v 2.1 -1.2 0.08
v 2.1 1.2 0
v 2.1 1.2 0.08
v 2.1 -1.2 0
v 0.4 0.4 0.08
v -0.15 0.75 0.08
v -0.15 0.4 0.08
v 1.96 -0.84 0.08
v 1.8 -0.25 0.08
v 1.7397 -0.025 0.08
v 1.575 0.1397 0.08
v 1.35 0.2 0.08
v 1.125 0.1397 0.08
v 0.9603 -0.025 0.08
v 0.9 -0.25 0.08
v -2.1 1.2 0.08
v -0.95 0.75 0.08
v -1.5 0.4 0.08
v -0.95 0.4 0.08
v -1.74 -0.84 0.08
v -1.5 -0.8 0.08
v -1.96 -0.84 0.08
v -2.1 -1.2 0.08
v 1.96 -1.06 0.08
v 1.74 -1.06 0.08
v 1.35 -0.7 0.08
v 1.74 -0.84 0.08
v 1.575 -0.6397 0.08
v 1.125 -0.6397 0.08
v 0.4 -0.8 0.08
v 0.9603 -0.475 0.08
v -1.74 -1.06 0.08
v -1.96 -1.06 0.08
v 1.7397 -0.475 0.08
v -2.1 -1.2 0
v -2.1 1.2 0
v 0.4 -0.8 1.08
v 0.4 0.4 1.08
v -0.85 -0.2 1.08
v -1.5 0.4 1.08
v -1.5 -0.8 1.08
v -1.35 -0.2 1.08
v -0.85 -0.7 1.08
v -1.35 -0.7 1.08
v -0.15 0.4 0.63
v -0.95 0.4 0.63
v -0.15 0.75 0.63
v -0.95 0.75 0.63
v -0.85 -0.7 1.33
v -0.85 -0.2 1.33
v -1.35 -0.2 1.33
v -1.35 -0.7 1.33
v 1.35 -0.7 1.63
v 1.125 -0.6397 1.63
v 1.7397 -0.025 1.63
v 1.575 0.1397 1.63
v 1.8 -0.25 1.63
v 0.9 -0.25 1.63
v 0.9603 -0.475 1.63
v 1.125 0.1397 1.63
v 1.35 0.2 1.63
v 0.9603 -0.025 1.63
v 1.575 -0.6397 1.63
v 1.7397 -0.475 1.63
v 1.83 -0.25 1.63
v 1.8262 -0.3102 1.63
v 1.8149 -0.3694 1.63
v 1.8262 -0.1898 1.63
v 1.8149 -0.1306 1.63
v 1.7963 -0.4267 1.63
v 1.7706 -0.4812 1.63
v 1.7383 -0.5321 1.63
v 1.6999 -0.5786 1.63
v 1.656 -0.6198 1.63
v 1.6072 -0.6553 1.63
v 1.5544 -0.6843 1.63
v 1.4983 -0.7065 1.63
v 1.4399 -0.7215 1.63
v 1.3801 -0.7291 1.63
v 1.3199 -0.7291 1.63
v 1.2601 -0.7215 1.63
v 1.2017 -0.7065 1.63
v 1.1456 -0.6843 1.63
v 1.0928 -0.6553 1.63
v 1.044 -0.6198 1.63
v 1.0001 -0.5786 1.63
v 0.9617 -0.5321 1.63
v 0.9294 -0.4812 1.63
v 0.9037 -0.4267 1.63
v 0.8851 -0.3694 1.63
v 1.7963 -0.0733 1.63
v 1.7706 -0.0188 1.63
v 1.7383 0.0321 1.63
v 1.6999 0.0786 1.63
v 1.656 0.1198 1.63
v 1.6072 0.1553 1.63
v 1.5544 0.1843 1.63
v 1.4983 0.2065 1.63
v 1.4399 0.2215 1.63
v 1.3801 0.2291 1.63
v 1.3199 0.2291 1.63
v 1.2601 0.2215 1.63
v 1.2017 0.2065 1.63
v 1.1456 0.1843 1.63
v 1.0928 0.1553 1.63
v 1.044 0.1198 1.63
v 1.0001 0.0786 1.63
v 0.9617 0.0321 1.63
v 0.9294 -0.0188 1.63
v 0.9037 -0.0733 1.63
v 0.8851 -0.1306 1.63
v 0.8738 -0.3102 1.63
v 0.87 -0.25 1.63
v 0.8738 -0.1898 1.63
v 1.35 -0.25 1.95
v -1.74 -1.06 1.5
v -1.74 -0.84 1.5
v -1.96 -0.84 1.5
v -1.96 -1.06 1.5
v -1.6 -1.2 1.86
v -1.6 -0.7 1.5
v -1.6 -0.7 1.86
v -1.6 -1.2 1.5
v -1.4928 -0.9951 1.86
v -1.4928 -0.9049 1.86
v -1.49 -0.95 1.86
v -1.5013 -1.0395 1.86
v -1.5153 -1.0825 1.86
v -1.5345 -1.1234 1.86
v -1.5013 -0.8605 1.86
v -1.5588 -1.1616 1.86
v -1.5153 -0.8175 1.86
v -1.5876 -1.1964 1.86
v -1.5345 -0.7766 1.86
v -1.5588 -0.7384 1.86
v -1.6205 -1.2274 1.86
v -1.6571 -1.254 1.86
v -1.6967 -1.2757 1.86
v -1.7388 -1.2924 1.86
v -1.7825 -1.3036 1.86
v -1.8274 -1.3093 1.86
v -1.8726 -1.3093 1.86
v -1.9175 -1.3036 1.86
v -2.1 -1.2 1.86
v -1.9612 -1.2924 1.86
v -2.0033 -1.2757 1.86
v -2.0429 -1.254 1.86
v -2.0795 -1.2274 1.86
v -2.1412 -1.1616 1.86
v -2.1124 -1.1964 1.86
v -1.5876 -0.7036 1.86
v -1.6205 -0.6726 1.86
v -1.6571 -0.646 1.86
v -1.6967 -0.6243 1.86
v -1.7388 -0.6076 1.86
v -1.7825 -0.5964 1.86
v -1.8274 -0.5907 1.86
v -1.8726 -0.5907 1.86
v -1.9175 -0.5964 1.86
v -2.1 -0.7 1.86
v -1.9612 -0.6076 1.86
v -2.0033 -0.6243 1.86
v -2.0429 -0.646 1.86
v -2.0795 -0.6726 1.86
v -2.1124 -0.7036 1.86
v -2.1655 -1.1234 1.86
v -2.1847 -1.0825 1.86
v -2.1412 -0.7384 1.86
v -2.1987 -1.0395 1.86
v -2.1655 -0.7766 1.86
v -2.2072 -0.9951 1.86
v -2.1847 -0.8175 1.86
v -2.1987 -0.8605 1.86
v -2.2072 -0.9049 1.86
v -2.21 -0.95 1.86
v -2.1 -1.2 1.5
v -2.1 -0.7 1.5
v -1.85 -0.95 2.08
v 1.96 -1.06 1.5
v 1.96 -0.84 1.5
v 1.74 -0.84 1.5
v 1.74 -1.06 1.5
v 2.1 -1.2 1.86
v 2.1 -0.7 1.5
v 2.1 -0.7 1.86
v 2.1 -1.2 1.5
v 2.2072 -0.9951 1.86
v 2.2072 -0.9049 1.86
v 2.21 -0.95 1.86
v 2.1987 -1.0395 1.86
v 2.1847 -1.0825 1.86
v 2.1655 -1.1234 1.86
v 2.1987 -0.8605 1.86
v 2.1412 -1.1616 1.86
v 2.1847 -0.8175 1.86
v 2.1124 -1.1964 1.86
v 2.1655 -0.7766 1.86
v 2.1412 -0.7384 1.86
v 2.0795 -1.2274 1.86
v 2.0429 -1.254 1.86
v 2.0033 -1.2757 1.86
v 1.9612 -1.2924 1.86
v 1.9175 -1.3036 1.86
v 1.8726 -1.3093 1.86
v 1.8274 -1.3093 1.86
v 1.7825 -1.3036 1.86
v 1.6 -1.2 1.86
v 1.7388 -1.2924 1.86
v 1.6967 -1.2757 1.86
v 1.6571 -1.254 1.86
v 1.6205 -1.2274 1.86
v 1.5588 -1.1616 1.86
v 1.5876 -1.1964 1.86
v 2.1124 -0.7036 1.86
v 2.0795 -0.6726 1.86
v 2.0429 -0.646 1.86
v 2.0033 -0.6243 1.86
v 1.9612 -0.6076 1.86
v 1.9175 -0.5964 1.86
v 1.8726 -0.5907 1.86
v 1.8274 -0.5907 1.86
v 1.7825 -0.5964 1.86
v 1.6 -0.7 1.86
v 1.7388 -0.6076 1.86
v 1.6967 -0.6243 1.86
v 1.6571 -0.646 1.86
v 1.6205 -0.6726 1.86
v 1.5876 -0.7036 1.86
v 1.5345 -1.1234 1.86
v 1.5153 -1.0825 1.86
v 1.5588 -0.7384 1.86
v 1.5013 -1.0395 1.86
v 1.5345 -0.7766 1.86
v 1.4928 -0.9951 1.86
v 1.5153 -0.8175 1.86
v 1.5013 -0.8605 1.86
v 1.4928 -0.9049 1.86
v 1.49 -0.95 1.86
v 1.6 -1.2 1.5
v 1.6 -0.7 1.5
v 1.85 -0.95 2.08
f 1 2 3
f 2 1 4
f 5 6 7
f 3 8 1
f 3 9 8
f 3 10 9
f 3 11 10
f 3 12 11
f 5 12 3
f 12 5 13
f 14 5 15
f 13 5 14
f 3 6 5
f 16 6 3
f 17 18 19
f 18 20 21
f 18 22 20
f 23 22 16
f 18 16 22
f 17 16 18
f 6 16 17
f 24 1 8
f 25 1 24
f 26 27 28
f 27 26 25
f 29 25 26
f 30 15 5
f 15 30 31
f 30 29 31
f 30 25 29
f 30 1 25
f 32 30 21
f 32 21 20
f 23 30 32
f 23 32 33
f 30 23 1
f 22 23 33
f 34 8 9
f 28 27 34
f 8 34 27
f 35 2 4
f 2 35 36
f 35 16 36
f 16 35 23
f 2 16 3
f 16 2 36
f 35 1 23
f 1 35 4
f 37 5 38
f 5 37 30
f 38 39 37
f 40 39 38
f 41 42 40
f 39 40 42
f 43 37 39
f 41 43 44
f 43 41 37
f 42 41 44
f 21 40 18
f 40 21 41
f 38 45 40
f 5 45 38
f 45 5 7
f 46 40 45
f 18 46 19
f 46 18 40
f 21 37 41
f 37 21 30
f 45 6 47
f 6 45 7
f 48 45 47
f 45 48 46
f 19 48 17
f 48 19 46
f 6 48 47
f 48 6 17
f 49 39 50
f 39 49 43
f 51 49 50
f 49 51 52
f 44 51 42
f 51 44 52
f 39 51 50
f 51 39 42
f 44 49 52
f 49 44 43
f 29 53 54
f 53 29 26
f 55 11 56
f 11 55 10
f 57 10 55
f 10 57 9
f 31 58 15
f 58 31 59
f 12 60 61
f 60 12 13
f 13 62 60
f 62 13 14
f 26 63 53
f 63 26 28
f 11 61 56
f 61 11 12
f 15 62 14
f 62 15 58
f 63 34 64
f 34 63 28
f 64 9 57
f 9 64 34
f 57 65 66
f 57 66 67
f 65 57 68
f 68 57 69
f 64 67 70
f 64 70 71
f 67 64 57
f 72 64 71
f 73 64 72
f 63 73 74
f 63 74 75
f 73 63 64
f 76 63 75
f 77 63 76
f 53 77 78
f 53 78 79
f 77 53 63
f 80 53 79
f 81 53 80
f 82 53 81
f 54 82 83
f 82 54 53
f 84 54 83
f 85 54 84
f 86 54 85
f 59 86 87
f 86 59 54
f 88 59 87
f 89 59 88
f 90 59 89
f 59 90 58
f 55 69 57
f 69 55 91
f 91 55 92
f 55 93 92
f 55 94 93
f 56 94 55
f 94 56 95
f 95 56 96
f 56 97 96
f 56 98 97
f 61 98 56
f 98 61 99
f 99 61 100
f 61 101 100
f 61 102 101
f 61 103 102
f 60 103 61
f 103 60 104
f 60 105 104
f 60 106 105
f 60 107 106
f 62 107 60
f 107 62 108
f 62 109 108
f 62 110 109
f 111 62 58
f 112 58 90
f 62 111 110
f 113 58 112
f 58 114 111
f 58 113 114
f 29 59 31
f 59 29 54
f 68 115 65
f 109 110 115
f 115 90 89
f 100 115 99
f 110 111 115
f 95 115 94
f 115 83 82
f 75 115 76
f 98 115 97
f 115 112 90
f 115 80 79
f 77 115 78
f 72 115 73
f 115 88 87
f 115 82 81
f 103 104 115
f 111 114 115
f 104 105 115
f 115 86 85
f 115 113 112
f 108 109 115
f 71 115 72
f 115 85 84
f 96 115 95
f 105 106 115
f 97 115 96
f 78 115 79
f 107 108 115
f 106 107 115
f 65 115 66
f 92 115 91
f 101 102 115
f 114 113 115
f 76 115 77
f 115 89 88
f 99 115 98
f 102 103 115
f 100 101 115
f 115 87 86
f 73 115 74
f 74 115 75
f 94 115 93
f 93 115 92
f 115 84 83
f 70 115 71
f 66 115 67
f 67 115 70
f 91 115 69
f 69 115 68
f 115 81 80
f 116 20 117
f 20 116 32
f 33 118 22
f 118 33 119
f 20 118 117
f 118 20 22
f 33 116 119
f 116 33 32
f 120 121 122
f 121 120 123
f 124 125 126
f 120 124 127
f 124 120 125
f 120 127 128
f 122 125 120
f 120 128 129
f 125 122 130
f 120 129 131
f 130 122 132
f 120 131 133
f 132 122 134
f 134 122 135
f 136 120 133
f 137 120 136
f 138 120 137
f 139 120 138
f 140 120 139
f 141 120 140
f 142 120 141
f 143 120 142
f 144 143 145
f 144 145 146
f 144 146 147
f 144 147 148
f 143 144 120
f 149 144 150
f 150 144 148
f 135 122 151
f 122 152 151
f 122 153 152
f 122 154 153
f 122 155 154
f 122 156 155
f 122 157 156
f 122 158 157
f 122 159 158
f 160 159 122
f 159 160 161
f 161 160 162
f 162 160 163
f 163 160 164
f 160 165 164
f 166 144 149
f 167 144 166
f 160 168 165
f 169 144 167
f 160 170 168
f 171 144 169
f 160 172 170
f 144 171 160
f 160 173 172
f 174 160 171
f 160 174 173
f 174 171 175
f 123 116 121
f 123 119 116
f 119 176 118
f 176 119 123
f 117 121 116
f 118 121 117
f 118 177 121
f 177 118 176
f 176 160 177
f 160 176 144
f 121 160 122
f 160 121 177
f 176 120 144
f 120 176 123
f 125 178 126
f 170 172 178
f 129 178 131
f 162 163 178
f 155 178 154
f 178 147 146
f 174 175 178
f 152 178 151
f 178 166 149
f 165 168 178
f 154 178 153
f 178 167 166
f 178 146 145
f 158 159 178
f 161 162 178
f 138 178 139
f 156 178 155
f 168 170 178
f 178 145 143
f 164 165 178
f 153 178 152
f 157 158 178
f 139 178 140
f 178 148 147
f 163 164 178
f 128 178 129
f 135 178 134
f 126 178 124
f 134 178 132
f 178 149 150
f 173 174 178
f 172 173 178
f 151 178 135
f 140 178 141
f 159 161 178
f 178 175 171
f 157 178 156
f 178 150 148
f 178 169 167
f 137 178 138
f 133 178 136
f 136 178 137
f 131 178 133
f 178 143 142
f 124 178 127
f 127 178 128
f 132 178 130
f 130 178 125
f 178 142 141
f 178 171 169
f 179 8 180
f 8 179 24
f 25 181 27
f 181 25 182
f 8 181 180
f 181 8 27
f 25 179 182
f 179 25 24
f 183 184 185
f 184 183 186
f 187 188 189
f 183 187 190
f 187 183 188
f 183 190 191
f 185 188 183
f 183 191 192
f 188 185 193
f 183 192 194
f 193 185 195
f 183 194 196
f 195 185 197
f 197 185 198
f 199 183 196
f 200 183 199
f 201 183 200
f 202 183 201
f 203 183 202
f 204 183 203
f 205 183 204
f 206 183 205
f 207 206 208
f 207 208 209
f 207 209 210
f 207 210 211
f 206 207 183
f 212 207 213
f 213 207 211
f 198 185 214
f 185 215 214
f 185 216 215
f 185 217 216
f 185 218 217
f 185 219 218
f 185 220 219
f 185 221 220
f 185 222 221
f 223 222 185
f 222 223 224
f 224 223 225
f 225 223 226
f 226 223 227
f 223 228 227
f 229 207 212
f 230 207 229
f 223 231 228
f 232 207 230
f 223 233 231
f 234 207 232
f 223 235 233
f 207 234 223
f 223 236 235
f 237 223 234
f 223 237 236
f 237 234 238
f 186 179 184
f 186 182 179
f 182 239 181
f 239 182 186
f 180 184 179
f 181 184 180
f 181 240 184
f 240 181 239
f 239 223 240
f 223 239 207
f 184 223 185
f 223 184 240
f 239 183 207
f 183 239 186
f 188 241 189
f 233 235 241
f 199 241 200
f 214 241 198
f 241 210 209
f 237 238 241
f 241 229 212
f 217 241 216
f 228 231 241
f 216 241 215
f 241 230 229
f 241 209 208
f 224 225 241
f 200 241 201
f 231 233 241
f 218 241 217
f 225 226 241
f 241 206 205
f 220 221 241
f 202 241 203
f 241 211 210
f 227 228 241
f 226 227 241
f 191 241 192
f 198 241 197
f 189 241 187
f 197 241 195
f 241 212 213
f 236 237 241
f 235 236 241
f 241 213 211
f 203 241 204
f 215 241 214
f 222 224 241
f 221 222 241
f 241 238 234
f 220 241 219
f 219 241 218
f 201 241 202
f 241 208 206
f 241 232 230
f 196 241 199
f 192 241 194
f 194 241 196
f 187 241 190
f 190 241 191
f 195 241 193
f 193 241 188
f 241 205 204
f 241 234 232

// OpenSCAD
union() {
  union() {
    union() {
      union() {
        union() {
          union() {
            union() {
              union() {
                union() {
                  union() {
                    union() {
                      translate([-2.1, 0, 0]) {
                        translate([0, -1.2, 0]) {
                          translate([0, 0, 0.0]) {
                            cube([4.2, 2.4, 8.0e-2]);
                          }
                        }
                      }
                      translate([-1.5, 0, 0]) {
                        translate([0, -0.8, 0]) {
                          translate([0, 0, 8.0e-2]) {
                            cube([1.9, 1.2, 1.0]);
                          }
                        }
                      }
                    }
                    translate([-0.95, 0, 0]) {
                      translate([0, 0.4, 0]) {
                        translate([0, 0, 8.0e-2]) {
                          cube([0.8, 0.35, 0.55]);
                        }
                      }
                    }
                  }
                  translate([-1.35, 0, 0]) {
                    translate([0, -0.7, 0]) {
                      translate([0, 0, 1.08]) {
                        cube([0.5, 0.5, 0.25]);
                      }
                    }
                  }
                }
                translate([1.35, 0, 0]) {
                  translate([0, -0.25, 0]) {
                    translate([0, 0, 8.0e-2]) {
                      cylinder(h = 1.55, r = 0.45, $fn = 12);
                    }
                  }
                }
              }
              translate([1.35, 0, 0]) {
                translate([0, -0.25, 0]) {
                  translate([0, 0, 1.63]) {
                    cylinder(h = 0.32, r1 = 0.48, r2 = 0);
                  }
                }
              }
            }
            translate([-1.96, 0, 0]) {
              translate([0, -1.06, 0]) {
                translate([0, 0, 8.0e-2]) {
                  cube([0.22, 0.22, 1.45]);
                }
              }
            }
          }
          translate([-2.1, 0, 0]) {
            translate([0, -1.2, 0]) {
              translate([0, 0, 1.5]) {
                cube([0.5, 0.5, 0.36]);
              }
            }
          }
        }
        translate([-1.85, 0, 0]) {
          translate([0, -0.95, 0]) {
            translate([0, 0, 1.86]) {
              cylinder(h = 0.22, r1 = 0.36, r2 = 0);
            }
          }
        }
      }
      translate([1.74, 0, 0]) {
        translate([0, -1.06, 0]) {
          translate([0, 0, 8.0e-2]) {
            cube([0.22, 0.22, 1.45]);
          }
        }
      }
    }
    translate([1.6, 0, 0]) {
      translate([0, -1.2, 0]) {
        translate([0, 0, 1.5]) {
          cube([0.5, 0.5, 0.36]);
        }
      }
    }
  }
  translate([1.85, 0, 0]) {
    translate([0, -0.95, 0]) {
      translate([0, 0, 1.86]) {
        cylinder(h = 0.22, r1 = 0.36, r2 = 0);
      }
    }
  }
}
$fn = 50;
